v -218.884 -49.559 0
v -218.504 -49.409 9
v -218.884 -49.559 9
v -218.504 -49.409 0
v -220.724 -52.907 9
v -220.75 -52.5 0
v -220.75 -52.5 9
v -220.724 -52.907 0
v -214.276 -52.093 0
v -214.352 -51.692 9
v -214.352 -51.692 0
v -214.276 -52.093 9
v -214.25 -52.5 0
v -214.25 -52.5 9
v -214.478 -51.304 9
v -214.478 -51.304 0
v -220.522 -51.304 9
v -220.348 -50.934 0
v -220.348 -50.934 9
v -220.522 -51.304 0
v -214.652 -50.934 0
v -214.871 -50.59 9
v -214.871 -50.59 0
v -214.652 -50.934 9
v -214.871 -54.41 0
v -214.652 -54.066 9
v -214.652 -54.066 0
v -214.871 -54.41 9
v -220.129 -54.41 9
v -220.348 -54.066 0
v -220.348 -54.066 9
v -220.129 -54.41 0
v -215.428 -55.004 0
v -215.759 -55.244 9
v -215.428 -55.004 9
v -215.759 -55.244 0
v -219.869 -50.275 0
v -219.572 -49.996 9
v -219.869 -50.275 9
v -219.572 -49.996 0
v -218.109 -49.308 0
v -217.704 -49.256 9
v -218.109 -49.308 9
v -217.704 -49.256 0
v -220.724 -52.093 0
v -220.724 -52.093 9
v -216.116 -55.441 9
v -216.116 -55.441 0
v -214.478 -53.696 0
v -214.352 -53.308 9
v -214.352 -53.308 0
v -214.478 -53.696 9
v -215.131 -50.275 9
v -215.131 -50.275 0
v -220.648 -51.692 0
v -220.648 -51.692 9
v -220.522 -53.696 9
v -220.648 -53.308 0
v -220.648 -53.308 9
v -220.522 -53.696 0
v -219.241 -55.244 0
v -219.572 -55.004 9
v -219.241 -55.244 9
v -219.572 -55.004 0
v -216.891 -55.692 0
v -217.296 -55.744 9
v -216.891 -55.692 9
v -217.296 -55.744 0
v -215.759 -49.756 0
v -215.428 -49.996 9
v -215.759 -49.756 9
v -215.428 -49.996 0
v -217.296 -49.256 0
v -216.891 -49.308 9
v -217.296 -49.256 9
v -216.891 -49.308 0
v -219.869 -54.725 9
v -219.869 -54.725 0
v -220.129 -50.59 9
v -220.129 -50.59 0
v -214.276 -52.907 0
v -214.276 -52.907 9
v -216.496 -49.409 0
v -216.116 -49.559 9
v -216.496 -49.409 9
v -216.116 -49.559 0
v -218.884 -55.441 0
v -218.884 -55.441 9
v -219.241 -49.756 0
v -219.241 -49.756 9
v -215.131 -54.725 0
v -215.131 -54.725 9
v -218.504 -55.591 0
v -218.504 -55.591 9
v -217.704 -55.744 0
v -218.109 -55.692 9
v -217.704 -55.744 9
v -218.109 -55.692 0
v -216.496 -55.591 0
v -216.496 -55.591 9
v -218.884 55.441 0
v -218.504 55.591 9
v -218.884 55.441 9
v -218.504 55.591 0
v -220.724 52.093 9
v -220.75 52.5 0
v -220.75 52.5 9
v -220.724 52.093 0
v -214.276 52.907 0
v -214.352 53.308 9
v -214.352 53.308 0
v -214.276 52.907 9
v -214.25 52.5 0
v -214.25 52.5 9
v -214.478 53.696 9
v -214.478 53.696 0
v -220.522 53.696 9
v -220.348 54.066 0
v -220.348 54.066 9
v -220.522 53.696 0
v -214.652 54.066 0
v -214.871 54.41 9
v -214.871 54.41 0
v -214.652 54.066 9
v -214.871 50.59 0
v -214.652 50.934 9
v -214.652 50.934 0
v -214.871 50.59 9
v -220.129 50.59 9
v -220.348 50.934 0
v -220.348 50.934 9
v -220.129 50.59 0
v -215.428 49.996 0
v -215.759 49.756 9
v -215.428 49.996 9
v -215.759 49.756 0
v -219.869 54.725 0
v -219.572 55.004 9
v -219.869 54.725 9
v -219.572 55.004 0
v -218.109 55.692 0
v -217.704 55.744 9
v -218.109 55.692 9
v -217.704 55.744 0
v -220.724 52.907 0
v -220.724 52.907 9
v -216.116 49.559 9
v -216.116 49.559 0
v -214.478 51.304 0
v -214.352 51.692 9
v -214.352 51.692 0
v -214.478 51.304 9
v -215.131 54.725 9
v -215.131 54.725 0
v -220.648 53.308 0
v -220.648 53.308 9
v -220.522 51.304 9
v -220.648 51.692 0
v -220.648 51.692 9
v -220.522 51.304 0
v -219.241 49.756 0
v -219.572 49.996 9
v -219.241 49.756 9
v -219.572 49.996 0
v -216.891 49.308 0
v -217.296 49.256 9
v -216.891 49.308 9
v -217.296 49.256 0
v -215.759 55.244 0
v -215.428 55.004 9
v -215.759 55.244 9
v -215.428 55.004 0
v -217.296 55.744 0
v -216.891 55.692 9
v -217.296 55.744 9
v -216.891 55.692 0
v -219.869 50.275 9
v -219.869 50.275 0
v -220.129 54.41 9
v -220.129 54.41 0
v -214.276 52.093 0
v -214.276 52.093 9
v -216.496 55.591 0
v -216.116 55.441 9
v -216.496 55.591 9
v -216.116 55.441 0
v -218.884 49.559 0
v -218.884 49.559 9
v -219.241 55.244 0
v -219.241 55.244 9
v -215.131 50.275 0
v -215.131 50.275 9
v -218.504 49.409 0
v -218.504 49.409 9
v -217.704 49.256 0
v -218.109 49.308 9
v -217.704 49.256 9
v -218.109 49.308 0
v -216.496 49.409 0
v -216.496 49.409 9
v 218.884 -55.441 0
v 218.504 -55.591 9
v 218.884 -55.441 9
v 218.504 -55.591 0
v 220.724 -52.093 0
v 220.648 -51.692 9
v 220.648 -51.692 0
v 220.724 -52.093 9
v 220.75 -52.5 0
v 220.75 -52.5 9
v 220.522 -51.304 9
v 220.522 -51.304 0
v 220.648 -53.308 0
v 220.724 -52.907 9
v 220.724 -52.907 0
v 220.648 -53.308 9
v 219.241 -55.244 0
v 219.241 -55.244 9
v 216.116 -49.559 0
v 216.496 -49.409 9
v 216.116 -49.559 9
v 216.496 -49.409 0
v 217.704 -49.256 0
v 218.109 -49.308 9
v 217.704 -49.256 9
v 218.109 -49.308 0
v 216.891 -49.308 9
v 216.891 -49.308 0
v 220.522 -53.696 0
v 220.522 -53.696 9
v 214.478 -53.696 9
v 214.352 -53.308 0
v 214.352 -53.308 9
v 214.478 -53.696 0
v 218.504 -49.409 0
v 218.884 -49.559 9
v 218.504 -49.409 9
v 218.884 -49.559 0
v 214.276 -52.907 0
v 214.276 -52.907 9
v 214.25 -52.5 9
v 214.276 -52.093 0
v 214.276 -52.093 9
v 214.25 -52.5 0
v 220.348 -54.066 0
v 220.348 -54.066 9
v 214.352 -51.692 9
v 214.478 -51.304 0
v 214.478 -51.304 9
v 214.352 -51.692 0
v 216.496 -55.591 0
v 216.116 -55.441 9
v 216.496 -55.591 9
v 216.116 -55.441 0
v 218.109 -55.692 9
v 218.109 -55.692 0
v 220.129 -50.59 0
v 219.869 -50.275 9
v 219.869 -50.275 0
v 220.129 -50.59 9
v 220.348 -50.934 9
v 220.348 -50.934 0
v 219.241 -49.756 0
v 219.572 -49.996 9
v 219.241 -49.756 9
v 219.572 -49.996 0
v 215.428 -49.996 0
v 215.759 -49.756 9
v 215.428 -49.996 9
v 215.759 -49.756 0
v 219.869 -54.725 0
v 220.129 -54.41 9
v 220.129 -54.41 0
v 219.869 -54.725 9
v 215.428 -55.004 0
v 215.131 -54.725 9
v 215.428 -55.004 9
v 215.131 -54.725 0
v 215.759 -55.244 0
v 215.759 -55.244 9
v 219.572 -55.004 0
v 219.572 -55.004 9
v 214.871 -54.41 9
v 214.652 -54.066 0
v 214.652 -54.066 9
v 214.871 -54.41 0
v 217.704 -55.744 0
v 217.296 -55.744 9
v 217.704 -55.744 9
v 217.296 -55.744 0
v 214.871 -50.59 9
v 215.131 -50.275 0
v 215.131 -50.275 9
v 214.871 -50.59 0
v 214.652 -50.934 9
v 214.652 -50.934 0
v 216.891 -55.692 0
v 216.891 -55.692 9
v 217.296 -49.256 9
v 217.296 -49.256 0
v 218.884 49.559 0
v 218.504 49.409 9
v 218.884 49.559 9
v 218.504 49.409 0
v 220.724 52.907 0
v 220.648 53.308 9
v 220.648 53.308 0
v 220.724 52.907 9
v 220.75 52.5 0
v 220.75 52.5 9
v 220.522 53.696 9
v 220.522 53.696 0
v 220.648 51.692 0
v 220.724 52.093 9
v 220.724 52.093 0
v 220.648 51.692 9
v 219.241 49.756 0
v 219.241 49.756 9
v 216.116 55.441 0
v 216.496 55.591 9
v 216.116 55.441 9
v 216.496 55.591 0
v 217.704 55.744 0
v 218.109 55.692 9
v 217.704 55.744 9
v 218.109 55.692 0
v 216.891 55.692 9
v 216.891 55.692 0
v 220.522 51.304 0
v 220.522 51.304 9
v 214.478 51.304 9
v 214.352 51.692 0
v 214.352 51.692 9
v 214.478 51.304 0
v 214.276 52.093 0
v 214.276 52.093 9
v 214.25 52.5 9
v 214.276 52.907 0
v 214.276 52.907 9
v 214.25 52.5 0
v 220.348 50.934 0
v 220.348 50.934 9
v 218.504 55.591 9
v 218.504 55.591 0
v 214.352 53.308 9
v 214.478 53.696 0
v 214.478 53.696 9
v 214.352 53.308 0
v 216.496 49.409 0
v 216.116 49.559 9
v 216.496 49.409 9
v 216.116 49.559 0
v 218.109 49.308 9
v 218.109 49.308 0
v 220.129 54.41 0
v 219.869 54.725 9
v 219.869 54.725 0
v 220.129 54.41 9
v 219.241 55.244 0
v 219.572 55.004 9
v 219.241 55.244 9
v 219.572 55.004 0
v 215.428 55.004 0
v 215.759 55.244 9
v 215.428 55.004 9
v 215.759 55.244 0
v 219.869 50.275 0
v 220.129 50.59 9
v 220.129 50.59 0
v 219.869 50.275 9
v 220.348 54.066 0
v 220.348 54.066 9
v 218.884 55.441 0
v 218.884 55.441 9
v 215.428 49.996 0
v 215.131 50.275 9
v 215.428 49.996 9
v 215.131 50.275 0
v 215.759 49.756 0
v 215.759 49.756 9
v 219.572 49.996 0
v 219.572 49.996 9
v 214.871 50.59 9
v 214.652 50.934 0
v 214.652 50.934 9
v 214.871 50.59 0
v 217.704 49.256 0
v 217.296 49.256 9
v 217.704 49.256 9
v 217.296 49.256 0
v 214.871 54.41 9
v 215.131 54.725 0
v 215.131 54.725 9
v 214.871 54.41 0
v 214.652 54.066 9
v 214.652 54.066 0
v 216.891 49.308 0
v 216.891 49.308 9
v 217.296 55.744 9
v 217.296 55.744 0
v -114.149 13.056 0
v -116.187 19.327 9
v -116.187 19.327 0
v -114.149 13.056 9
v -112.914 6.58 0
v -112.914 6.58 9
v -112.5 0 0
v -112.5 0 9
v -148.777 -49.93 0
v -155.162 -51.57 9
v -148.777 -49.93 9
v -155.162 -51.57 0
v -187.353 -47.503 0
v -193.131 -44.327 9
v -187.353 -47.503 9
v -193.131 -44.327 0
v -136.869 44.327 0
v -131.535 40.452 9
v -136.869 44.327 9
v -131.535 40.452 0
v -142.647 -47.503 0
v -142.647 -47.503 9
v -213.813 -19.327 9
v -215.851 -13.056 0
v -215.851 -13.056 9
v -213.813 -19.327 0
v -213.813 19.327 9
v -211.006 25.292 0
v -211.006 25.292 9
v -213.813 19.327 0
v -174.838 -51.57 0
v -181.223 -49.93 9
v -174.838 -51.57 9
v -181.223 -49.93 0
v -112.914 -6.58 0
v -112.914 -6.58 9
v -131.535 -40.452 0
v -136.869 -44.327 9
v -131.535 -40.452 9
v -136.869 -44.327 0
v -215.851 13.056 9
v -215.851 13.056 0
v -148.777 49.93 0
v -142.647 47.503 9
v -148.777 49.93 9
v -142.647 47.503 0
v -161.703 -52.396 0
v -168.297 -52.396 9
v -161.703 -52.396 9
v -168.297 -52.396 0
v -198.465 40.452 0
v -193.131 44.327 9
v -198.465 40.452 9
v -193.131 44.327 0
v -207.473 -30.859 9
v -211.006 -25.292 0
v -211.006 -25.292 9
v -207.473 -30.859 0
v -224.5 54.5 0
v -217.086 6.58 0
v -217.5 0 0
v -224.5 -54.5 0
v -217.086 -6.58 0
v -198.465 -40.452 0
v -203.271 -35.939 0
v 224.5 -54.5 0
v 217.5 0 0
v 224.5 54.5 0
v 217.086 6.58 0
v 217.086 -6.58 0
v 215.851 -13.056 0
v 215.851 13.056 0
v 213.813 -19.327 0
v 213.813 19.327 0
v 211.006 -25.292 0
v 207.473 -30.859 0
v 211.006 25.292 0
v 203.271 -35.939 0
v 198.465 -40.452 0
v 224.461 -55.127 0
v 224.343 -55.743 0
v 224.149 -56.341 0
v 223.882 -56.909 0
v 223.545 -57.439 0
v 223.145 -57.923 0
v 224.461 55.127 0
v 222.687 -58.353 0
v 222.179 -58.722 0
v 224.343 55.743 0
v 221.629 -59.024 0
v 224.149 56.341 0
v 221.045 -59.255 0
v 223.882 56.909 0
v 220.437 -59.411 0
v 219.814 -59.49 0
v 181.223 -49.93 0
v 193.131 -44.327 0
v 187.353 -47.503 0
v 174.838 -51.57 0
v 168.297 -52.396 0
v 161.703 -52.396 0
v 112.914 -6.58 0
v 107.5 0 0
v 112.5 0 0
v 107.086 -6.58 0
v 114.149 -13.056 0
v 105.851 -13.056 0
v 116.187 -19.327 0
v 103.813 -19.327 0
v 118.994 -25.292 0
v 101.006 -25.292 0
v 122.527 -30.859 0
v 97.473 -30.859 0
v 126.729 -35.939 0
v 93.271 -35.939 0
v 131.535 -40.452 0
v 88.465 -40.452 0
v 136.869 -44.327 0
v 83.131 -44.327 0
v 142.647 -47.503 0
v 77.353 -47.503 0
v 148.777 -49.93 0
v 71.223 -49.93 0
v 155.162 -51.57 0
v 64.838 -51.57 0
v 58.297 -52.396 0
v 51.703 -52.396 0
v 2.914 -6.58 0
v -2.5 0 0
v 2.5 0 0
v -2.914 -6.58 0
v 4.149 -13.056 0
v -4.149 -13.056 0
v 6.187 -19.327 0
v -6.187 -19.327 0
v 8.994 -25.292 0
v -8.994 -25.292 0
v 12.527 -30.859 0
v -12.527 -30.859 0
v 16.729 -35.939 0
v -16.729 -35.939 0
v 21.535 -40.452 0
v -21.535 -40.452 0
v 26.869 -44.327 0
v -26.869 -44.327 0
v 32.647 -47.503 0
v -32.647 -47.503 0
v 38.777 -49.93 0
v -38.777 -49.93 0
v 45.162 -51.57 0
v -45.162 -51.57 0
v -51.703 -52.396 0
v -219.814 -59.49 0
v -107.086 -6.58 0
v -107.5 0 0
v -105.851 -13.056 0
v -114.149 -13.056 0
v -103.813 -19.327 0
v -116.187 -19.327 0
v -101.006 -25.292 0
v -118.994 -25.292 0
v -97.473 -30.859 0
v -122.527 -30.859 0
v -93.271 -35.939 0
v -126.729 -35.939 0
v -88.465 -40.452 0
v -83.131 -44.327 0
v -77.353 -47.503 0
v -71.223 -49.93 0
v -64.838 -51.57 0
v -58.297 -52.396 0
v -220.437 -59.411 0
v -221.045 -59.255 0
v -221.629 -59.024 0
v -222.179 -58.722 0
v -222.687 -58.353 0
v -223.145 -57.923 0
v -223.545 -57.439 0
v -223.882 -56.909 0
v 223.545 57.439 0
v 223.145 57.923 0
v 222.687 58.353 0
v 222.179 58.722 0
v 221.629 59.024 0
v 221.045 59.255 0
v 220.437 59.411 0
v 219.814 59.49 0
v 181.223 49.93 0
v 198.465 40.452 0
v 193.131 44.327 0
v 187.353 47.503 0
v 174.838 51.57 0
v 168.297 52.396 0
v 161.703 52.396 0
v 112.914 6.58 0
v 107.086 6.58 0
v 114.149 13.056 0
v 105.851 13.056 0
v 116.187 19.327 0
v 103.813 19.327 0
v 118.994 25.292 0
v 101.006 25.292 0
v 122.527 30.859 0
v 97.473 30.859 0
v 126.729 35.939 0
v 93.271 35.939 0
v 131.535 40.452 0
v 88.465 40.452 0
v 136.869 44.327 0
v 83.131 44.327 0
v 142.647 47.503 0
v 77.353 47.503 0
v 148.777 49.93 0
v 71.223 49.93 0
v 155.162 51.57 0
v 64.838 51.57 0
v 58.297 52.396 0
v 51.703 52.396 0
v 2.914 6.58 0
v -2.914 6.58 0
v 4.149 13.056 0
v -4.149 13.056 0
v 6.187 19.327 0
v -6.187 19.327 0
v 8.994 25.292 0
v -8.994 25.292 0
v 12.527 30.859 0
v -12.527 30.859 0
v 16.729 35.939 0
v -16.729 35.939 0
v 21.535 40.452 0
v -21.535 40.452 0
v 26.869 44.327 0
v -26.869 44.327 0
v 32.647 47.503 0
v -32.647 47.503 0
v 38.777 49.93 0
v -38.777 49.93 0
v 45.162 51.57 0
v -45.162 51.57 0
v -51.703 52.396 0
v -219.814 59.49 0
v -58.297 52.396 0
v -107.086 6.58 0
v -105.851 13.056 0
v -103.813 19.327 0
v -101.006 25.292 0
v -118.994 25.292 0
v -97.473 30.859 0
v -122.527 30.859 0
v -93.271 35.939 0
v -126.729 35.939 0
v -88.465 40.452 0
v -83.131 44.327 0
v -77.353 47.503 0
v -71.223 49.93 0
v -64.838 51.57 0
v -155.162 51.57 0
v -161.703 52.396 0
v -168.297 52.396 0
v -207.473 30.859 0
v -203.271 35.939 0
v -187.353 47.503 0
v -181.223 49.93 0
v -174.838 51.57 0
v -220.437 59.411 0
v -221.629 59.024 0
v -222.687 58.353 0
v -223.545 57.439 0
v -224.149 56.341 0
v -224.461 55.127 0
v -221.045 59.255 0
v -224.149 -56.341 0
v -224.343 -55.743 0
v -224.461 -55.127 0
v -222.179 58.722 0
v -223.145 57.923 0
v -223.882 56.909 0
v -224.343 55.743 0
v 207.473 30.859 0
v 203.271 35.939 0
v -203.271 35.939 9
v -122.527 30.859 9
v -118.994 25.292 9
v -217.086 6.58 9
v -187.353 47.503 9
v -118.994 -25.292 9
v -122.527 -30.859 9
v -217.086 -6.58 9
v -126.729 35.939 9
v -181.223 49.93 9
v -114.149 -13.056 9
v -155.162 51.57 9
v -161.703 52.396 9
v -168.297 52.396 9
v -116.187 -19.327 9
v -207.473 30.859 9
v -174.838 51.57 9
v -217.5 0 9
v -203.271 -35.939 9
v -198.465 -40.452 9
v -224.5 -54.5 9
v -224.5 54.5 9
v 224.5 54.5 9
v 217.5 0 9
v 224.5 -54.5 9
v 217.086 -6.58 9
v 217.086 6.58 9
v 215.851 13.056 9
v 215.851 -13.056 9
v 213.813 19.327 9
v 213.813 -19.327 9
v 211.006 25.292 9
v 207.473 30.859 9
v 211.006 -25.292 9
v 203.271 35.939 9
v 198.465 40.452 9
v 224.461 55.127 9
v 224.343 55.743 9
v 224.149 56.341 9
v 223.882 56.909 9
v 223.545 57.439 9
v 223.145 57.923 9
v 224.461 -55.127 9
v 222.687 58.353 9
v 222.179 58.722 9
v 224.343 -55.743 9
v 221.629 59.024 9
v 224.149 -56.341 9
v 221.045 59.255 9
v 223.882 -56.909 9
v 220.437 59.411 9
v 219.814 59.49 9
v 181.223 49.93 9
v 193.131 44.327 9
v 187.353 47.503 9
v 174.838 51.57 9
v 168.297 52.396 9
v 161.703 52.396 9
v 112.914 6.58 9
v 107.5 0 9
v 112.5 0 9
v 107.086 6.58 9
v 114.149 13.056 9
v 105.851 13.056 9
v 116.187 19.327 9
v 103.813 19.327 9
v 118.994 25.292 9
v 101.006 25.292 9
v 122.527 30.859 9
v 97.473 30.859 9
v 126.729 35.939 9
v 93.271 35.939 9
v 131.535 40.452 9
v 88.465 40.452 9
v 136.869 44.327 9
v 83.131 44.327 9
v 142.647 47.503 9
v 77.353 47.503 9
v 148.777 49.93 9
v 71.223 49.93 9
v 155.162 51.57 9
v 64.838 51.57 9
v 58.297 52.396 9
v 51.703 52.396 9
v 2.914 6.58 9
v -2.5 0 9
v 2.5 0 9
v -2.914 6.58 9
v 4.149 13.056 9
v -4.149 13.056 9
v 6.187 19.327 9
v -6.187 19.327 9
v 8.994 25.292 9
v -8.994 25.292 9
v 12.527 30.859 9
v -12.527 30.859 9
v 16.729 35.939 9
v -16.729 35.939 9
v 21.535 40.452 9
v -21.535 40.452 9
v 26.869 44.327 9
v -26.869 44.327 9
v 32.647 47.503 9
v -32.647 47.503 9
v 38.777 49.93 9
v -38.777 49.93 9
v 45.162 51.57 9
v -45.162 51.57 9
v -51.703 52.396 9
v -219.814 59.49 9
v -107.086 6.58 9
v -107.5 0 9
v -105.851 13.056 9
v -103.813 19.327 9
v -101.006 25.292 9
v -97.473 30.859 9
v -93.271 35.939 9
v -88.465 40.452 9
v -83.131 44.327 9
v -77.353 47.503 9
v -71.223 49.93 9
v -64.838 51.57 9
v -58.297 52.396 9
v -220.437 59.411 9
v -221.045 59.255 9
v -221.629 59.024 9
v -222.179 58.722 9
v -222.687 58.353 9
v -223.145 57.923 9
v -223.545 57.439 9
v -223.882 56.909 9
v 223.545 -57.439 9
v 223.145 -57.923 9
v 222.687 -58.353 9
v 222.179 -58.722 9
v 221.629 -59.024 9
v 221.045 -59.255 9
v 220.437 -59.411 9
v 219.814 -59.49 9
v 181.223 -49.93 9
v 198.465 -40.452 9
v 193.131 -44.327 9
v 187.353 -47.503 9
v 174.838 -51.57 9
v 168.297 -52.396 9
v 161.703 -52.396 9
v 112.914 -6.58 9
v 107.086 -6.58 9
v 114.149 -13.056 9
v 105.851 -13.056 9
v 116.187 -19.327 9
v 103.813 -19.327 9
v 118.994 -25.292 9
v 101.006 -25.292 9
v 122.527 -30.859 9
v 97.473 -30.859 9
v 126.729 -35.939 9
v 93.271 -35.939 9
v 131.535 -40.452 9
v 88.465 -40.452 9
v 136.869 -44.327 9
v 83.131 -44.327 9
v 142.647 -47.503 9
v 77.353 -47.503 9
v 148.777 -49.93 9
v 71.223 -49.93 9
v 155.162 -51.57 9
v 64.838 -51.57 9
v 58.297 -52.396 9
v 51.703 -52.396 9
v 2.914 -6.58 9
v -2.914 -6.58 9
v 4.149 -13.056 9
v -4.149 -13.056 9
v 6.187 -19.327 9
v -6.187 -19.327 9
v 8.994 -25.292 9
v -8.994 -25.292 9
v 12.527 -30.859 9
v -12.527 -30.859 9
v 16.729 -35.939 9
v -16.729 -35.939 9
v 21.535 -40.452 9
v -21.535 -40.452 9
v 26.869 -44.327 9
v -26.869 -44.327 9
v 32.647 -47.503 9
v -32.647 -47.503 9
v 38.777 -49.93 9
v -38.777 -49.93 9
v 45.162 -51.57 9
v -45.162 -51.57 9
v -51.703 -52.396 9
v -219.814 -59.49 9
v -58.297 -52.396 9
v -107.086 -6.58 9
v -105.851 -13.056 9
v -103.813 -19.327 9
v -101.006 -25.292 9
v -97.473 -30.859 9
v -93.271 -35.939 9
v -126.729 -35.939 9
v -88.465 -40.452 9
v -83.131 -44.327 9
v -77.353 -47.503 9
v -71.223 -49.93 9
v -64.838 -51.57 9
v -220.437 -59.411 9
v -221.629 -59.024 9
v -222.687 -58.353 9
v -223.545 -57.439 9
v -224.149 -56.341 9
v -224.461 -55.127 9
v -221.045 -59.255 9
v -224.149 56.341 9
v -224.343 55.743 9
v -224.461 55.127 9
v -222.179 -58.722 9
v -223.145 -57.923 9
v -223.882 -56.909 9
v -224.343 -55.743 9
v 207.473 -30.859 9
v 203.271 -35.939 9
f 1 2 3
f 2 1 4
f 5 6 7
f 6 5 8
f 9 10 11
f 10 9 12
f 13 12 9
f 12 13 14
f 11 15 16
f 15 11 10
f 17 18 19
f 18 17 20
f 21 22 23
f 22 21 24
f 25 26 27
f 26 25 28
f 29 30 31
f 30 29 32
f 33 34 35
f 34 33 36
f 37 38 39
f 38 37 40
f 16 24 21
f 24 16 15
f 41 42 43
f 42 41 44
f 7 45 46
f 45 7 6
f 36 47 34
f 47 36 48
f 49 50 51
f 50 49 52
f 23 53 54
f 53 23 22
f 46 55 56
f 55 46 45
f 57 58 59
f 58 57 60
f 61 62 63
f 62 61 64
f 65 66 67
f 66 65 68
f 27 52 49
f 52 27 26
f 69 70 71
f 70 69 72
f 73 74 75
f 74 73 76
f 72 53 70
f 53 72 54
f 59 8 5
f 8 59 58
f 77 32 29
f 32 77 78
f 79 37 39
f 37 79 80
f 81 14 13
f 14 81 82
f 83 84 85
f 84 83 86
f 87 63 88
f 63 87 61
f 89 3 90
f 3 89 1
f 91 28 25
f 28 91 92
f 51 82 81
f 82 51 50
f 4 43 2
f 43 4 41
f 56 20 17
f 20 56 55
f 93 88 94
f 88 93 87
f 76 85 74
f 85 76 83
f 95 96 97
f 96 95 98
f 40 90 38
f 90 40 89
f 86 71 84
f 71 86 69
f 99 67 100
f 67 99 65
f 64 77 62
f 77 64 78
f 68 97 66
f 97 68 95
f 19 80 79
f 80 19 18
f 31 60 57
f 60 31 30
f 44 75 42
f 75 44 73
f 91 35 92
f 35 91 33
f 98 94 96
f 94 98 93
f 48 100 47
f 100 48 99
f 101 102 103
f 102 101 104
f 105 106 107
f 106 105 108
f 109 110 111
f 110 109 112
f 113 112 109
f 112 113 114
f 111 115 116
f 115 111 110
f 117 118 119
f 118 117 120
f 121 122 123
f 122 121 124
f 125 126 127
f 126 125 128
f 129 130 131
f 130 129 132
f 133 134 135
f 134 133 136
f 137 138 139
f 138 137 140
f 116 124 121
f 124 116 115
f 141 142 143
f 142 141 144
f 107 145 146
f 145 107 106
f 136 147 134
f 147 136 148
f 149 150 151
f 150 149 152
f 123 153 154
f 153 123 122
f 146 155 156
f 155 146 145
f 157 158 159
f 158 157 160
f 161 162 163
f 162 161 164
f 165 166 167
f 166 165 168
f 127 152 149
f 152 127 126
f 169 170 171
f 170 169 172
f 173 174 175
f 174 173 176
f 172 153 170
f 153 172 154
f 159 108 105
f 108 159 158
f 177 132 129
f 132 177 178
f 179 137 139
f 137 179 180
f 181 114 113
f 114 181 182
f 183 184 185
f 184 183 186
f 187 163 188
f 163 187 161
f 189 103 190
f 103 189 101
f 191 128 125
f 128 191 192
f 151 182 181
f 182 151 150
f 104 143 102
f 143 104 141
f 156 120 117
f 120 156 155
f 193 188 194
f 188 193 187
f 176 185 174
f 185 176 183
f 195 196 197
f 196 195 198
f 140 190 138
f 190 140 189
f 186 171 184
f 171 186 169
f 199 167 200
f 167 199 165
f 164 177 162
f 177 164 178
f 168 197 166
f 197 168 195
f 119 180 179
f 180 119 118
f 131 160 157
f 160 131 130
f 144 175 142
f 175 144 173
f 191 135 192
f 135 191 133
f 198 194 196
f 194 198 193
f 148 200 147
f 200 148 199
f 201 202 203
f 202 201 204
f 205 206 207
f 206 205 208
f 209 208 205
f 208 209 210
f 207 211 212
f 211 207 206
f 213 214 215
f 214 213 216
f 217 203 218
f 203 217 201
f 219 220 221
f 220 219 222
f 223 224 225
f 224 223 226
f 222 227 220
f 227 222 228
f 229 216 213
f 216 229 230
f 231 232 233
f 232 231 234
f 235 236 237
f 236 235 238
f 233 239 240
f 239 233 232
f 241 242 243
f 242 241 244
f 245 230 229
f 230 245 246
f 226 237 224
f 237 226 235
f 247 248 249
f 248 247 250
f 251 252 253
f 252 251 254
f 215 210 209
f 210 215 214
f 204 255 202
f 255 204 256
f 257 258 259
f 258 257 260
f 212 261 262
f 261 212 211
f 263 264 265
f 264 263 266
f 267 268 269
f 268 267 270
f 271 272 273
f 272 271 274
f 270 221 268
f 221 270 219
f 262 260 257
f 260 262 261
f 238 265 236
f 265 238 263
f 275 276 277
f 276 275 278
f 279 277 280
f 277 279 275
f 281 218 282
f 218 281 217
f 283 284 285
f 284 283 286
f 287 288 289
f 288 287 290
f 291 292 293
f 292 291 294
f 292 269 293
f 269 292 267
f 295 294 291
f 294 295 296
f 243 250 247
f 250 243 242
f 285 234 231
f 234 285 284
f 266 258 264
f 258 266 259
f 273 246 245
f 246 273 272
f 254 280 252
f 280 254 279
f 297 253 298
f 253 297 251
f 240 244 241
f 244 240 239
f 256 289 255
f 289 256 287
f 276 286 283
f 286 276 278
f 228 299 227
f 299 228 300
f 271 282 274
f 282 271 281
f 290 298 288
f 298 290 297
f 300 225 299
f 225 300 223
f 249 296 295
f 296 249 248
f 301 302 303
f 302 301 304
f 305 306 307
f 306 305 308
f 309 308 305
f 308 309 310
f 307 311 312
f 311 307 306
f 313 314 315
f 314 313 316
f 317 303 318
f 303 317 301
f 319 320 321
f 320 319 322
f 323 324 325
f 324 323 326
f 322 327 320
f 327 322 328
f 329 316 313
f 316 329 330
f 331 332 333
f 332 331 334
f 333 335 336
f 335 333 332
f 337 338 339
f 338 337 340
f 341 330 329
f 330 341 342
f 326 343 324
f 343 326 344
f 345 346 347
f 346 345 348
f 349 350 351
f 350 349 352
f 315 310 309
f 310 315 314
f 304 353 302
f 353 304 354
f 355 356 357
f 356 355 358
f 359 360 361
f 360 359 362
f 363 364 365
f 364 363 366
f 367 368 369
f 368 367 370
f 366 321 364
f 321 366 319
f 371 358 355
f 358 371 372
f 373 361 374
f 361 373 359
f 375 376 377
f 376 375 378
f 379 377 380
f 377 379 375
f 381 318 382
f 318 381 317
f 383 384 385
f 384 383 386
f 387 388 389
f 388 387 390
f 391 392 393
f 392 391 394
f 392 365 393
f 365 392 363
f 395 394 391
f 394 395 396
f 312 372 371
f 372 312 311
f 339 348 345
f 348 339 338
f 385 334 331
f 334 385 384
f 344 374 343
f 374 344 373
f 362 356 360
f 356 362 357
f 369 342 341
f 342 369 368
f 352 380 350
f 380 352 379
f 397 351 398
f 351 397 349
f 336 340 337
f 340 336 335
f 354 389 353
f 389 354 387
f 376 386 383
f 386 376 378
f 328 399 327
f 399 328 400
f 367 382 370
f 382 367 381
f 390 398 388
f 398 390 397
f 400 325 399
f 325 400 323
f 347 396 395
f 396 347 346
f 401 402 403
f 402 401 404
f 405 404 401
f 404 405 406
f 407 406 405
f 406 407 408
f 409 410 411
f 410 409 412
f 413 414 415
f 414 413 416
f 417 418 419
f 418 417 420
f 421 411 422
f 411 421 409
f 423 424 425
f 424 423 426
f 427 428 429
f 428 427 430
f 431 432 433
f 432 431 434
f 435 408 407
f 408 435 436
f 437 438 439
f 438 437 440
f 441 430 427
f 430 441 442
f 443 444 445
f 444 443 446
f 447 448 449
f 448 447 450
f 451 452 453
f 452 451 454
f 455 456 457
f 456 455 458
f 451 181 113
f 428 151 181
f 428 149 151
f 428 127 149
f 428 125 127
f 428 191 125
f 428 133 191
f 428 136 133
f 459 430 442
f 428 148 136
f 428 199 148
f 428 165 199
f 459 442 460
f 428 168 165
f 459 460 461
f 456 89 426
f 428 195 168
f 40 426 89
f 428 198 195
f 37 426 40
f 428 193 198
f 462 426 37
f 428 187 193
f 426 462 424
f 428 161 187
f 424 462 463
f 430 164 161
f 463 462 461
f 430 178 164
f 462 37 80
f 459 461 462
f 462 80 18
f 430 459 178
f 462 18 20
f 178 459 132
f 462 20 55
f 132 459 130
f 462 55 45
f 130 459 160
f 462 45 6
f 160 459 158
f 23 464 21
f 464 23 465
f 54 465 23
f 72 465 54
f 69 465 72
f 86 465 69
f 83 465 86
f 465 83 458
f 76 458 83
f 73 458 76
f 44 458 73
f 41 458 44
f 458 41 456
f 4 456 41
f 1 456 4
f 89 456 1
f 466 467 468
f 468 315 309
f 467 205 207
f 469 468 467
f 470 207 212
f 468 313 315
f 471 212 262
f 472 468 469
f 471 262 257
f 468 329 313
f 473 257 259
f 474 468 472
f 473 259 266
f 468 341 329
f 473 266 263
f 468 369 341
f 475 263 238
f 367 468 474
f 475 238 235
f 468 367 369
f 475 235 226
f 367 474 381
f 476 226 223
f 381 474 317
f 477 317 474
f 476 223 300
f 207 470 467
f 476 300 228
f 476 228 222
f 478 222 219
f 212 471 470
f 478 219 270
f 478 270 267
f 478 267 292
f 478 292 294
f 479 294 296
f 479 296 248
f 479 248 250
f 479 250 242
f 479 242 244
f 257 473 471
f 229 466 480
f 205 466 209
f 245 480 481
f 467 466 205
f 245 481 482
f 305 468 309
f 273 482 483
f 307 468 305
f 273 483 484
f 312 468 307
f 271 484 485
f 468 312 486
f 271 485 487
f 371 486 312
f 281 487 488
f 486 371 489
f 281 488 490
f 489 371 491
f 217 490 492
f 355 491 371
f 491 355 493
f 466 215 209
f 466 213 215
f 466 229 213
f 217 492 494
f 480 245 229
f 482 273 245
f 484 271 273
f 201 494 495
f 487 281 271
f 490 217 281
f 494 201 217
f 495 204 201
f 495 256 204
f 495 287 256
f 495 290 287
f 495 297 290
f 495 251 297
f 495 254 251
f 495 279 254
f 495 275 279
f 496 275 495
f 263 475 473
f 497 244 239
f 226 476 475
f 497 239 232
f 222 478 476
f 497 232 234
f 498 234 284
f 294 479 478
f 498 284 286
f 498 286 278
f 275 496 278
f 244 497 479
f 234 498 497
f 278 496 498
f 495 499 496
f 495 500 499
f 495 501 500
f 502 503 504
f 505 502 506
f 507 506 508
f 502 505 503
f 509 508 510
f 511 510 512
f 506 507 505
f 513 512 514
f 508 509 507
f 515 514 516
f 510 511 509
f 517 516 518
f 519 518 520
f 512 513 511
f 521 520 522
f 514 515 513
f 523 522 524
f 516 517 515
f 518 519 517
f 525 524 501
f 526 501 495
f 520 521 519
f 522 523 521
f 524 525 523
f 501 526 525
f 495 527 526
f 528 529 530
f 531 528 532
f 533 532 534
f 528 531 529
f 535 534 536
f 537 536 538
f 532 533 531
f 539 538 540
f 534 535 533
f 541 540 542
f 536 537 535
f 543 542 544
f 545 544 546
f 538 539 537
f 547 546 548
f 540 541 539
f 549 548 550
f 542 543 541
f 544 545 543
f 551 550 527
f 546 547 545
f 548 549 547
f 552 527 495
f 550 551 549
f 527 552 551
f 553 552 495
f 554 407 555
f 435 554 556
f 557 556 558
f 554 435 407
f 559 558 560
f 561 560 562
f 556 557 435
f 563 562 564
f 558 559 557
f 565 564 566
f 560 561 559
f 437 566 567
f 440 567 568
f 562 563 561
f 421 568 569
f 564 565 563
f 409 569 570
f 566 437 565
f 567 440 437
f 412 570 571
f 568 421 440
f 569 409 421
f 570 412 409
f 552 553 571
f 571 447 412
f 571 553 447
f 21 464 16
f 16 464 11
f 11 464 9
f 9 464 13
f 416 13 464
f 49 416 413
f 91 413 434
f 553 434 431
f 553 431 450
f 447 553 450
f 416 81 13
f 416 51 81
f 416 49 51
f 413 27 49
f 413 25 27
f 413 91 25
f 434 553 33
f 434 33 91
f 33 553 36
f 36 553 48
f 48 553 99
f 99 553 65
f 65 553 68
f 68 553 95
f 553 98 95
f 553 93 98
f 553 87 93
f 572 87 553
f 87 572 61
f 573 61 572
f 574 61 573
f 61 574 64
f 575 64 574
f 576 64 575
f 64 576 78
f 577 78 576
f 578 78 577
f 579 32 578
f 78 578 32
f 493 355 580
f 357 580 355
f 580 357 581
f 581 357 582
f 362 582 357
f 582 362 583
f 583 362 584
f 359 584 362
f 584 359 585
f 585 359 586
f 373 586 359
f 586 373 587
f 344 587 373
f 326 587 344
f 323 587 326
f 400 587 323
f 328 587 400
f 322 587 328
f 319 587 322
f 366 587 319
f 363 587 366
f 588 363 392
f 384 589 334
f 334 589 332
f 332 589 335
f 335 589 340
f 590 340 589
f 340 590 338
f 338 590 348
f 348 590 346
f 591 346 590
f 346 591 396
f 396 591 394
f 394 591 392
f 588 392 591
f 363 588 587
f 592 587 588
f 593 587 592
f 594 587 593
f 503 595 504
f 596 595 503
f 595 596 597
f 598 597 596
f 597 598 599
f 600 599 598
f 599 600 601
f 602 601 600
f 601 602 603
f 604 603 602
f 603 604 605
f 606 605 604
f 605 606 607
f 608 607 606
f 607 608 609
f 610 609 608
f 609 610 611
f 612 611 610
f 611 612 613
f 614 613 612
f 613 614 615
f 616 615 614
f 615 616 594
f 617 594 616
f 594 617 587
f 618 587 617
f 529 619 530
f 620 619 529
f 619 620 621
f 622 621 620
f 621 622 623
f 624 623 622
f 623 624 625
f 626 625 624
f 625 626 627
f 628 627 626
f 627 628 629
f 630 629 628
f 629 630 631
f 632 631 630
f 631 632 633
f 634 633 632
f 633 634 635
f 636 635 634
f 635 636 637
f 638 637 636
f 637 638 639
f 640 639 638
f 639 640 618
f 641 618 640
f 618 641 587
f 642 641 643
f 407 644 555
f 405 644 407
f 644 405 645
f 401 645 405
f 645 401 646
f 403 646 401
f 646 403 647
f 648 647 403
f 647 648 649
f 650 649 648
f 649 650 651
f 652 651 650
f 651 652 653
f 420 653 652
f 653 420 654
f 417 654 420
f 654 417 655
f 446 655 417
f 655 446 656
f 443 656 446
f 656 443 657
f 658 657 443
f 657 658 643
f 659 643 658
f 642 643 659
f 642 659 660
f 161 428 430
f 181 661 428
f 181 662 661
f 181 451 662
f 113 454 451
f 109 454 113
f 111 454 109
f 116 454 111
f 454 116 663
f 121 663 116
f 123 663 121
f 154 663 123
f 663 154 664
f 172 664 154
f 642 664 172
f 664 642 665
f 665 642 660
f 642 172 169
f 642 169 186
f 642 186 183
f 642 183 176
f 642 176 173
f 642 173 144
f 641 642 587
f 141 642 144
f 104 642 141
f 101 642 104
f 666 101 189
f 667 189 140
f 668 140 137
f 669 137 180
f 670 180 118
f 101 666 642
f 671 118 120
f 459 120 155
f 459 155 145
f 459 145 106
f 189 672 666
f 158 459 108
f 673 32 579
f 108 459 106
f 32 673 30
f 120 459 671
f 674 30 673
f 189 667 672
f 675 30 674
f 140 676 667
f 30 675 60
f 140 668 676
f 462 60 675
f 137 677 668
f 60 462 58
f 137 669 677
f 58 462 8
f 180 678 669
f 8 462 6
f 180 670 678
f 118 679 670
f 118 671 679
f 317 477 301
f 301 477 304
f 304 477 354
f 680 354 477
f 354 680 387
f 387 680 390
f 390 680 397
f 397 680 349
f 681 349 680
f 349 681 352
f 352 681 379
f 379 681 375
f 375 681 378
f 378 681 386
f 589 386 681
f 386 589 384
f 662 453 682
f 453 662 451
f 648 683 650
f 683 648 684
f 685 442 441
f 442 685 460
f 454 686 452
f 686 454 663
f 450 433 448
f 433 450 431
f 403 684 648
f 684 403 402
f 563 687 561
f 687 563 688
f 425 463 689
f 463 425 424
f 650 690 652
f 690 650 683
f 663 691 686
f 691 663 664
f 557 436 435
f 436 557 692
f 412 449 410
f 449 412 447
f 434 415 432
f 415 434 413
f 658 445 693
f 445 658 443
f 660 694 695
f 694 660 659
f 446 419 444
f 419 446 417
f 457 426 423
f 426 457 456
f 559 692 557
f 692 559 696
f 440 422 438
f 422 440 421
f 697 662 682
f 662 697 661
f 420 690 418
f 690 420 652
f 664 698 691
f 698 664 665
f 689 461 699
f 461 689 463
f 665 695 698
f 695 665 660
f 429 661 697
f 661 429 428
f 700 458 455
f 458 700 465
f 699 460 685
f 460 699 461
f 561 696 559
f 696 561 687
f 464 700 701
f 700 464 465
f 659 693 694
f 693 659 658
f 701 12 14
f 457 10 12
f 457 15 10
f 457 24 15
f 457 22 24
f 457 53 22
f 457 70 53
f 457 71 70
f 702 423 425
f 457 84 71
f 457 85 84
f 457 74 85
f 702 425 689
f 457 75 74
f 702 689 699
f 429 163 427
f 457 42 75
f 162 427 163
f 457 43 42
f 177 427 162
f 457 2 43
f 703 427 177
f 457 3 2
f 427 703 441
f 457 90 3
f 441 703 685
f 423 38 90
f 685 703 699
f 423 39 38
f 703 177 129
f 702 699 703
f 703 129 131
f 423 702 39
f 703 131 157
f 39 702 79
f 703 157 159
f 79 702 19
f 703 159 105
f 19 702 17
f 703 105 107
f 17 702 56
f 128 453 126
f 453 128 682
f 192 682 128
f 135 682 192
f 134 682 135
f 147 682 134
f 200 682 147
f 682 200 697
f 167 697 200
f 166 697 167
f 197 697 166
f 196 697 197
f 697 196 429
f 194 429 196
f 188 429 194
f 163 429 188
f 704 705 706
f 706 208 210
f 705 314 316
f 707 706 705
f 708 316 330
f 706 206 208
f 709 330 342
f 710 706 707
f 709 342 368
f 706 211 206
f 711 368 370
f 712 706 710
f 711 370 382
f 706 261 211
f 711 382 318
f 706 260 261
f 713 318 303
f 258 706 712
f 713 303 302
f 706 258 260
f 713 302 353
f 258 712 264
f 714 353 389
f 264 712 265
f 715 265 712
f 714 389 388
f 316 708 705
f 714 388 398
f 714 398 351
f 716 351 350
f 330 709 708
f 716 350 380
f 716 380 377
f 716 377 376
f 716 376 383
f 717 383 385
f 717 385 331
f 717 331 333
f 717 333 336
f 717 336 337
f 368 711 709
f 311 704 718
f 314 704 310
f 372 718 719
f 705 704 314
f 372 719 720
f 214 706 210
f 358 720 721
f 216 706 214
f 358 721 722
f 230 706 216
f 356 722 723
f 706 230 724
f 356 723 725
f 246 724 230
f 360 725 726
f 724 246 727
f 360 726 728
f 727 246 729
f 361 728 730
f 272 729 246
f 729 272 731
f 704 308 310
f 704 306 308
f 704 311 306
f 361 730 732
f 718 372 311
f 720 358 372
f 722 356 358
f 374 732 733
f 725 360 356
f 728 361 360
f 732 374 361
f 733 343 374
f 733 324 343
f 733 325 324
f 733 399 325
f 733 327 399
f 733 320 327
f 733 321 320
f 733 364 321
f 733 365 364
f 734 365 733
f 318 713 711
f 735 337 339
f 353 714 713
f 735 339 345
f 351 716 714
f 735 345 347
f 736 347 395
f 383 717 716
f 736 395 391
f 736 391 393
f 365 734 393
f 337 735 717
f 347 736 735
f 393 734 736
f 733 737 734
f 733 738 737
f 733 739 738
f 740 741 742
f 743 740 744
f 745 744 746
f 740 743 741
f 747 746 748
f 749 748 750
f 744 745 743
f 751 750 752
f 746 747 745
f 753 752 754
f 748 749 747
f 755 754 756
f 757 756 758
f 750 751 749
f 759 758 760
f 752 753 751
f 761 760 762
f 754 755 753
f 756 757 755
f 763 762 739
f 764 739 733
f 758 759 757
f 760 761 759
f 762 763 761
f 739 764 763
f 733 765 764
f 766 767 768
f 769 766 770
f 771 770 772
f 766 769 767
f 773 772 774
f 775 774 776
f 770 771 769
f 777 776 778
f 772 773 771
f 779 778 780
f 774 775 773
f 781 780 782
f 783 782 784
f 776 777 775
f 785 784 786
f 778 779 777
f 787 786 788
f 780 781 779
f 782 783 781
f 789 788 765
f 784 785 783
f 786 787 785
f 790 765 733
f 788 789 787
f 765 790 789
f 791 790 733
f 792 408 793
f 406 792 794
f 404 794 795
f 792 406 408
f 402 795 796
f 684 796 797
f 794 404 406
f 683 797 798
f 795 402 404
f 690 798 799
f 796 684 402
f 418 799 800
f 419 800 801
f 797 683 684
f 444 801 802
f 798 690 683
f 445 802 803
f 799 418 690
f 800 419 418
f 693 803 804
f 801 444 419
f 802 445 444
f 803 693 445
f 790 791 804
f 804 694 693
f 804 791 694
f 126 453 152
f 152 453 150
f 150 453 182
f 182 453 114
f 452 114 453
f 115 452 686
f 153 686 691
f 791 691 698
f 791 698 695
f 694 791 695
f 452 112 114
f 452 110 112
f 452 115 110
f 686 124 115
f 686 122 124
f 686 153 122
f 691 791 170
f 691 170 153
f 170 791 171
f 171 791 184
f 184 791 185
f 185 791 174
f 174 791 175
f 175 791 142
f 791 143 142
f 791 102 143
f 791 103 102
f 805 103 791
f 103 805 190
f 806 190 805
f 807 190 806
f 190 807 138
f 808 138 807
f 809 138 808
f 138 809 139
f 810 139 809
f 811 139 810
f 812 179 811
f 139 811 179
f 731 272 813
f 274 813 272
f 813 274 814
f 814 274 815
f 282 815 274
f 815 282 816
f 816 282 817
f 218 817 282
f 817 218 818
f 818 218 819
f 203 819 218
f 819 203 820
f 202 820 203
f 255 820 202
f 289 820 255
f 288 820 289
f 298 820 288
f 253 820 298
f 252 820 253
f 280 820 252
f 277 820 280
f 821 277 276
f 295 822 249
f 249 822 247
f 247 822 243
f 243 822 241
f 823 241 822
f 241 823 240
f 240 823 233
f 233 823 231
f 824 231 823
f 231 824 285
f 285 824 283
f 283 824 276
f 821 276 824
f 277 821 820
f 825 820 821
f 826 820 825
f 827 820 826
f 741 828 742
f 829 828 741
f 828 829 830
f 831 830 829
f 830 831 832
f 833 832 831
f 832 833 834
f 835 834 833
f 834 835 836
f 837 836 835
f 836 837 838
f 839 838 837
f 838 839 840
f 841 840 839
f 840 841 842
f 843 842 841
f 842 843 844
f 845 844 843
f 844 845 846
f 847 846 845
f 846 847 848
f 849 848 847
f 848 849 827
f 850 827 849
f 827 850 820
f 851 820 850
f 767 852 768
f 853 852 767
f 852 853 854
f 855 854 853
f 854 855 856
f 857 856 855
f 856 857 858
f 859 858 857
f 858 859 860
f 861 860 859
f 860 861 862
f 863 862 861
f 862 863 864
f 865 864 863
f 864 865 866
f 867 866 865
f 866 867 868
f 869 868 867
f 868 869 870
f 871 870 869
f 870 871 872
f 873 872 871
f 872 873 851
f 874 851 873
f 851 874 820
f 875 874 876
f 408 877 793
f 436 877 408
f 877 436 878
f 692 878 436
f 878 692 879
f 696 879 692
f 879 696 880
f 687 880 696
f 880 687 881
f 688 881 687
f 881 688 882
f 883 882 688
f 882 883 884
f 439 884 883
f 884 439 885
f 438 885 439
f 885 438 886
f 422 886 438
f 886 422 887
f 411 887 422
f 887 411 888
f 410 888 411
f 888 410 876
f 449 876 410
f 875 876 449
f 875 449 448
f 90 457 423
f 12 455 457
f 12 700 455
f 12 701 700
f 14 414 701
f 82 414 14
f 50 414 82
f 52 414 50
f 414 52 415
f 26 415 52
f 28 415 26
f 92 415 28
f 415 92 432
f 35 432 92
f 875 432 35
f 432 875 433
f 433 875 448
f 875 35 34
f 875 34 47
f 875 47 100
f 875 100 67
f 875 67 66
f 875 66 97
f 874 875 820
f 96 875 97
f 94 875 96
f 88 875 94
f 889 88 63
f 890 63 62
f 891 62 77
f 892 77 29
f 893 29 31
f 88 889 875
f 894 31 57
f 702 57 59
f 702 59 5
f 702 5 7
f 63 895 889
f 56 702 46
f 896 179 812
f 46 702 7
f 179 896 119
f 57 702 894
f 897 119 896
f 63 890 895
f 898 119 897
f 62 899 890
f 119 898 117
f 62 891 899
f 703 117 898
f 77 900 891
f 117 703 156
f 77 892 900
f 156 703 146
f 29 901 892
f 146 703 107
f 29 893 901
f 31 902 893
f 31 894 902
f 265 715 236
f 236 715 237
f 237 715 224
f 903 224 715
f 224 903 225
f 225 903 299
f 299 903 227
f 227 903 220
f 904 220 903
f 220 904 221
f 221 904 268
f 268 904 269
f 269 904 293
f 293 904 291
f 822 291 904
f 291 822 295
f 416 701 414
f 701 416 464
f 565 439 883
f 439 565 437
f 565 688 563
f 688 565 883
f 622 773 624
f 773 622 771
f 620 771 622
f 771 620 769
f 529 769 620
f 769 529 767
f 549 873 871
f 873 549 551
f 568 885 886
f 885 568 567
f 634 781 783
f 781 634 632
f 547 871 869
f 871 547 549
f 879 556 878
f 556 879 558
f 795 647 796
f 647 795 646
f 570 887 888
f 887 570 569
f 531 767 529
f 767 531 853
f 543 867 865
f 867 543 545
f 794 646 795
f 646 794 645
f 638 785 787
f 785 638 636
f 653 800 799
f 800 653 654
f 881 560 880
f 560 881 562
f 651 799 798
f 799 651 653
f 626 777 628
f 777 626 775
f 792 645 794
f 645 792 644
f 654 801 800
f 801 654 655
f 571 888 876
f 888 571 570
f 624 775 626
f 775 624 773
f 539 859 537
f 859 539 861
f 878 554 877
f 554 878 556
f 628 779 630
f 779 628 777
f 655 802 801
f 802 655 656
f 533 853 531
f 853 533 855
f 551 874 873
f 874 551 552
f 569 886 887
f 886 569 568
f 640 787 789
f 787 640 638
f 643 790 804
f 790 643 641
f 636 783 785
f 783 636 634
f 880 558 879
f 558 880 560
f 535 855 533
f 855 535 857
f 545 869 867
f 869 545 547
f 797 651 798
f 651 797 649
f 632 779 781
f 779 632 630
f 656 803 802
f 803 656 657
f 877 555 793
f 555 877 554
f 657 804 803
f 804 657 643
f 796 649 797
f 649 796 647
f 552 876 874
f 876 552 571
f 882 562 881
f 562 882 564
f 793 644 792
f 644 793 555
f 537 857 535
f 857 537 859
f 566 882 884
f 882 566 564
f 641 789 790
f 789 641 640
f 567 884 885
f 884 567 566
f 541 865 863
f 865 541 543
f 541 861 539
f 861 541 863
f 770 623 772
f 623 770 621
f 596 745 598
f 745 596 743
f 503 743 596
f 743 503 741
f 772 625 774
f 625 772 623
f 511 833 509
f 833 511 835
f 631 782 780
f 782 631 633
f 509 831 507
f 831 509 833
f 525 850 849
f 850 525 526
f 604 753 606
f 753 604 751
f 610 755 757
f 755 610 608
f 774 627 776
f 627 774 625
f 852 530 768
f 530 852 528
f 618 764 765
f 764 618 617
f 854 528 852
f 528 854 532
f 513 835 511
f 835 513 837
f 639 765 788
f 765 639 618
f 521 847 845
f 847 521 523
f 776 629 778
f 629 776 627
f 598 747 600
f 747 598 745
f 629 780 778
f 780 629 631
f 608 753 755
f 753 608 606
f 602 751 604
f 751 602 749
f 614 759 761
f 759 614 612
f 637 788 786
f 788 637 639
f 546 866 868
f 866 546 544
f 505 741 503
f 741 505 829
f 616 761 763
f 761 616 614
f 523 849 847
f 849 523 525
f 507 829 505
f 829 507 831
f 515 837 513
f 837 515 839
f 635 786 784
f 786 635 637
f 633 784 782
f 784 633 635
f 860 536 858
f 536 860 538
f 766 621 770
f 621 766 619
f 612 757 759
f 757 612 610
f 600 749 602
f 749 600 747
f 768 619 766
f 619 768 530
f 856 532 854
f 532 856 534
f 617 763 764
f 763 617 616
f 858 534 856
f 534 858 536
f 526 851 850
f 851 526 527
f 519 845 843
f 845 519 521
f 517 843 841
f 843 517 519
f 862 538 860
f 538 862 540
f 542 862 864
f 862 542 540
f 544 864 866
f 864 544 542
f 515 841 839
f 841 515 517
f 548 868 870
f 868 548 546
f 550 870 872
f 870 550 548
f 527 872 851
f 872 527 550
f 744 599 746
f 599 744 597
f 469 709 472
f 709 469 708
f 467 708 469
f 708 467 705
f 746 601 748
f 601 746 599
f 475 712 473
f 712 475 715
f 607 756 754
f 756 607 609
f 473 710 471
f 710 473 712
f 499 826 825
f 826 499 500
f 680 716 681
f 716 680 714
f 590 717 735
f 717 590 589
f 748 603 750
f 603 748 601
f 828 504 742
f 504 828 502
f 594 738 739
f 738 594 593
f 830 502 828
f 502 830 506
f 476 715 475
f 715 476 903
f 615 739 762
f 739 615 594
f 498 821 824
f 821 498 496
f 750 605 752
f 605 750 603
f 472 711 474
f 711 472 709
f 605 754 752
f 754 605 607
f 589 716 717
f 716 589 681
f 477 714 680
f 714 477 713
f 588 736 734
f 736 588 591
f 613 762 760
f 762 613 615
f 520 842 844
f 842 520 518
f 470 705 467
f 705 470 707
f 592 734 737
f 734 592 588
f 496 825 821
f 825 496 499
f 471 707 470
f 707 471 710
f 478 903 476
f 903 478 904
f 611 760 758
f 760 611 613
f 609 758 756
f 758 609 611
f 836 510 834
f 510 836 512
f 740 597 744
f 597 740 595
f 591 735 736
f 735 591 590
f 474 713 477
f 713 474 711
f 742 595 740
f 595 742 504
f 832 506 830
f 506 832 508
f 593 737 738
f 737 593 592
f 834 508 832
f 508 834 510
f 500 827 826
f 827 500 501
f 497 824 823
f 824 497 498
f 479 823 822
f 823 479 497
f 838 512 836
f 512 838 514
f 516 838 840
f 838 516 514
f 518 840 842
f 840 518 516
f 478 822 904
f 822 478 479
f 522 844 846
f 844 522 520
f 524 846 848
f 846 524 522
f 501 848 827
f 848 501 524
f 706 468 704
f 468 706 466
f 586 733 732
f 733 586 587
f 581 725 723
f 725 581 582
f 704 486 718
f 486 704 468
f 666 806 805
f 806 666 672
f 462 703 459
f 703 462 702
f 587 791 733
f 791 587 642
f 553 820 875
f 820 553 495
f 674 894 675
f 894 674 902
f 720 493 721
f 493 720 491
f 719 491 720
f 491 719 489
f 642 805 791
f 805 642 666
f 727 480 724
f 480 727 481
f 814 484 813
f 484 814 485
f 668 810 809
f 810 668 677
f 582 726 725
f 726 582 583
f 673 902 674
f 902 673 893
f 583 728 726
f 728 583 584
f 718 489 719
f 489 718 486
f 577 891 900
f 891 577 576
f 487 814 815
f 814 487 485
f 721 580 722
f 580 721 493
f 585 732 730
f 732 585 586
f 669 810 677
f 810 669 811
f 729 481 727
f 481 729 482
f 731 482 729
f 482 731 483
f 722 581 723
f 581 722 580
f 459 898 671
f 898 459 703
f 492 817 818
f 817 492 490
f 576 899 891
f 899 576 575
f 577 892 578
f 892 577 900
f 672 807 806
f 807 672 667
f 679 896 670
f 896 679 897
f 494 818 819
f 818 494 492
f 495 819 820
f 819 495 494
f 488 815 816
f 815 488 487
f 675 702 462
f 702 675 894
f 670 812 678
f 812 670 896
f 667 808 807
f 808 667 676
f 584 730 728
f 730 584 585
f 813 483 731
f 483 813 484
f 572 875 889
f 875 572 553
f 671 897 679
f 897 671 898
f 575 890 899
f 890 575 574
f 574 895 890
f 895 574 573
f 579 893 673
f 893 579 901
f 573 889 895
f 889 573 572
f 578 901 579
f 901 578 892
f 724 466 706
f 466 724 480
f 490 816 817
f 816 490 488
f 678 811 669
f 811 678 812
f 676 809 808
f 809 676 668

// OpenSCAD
$fn = 50;

difference() {
	union() {
		hull() {
			translate(v = [-219.5, 54.5, 0]) {
				cylinder(h = 9, r = 5);
			}
			translate(v = [219.5, 54.5, 0]) {
				cylinder(h = 9, r = 5);
			}
			translate(v = [-219.5, -54.5, 0]) {
				cylinder(h = 9, r = 5);
			}
			translate(v = [219.5, -54.5, 0]) {
				cylinder(h = 9, r = 5);
			}
		}
	}
	union() {
		translate(v = [-217.5, -52.5, -100.0]) {
			cylinder(h = 200, r = 3.25);
		}
		translate(v = [-217.5, 52.5, -100.0]) {
			cylinder(h = 200, r = 3.25);
		}
		translate(v = [217.5, -52.5, -100.0]) {
			cylinder(h = 200, r = 3.25);
		}
		translate(v = [217.5, 52.5, -100.0]) {
			cylinder(h = 200, r = 3.25);
		}
		translate(v = [-217.5, -52.5, -100.0]) {
			cylinder(h = 200, r = 1.8);
		}
		translate(v = [-217.5, 52.5, -100.0]) {
			cylinder(h = 200, r = 1.8);
		}
		translate(v = [217.5, -52.5, -100.0]) {
			cylinder(h = 200, r = 1.8);
		}
		translate(v = [217.5, 52.5, -100.0]) {
			cylinder(h = 200, r = 1.8);
		}
		translate(v = [-165.0, 0, 0.0]) {
			cylinder(h = 9, r = 52.5);
		}
		translate(v = [-55.0, 0, 0.0]) {
			cylinder(h = 9, r = 52.5);
		}
		translate(v = [55.0, 0, 0.0]) {
			cylinder(h = 9, r = 52.5);
		}
		translate(v = [165.0, 0, 0.0]) {
			cylinder(h = 9, r = 52.5);
		}
	}
}
